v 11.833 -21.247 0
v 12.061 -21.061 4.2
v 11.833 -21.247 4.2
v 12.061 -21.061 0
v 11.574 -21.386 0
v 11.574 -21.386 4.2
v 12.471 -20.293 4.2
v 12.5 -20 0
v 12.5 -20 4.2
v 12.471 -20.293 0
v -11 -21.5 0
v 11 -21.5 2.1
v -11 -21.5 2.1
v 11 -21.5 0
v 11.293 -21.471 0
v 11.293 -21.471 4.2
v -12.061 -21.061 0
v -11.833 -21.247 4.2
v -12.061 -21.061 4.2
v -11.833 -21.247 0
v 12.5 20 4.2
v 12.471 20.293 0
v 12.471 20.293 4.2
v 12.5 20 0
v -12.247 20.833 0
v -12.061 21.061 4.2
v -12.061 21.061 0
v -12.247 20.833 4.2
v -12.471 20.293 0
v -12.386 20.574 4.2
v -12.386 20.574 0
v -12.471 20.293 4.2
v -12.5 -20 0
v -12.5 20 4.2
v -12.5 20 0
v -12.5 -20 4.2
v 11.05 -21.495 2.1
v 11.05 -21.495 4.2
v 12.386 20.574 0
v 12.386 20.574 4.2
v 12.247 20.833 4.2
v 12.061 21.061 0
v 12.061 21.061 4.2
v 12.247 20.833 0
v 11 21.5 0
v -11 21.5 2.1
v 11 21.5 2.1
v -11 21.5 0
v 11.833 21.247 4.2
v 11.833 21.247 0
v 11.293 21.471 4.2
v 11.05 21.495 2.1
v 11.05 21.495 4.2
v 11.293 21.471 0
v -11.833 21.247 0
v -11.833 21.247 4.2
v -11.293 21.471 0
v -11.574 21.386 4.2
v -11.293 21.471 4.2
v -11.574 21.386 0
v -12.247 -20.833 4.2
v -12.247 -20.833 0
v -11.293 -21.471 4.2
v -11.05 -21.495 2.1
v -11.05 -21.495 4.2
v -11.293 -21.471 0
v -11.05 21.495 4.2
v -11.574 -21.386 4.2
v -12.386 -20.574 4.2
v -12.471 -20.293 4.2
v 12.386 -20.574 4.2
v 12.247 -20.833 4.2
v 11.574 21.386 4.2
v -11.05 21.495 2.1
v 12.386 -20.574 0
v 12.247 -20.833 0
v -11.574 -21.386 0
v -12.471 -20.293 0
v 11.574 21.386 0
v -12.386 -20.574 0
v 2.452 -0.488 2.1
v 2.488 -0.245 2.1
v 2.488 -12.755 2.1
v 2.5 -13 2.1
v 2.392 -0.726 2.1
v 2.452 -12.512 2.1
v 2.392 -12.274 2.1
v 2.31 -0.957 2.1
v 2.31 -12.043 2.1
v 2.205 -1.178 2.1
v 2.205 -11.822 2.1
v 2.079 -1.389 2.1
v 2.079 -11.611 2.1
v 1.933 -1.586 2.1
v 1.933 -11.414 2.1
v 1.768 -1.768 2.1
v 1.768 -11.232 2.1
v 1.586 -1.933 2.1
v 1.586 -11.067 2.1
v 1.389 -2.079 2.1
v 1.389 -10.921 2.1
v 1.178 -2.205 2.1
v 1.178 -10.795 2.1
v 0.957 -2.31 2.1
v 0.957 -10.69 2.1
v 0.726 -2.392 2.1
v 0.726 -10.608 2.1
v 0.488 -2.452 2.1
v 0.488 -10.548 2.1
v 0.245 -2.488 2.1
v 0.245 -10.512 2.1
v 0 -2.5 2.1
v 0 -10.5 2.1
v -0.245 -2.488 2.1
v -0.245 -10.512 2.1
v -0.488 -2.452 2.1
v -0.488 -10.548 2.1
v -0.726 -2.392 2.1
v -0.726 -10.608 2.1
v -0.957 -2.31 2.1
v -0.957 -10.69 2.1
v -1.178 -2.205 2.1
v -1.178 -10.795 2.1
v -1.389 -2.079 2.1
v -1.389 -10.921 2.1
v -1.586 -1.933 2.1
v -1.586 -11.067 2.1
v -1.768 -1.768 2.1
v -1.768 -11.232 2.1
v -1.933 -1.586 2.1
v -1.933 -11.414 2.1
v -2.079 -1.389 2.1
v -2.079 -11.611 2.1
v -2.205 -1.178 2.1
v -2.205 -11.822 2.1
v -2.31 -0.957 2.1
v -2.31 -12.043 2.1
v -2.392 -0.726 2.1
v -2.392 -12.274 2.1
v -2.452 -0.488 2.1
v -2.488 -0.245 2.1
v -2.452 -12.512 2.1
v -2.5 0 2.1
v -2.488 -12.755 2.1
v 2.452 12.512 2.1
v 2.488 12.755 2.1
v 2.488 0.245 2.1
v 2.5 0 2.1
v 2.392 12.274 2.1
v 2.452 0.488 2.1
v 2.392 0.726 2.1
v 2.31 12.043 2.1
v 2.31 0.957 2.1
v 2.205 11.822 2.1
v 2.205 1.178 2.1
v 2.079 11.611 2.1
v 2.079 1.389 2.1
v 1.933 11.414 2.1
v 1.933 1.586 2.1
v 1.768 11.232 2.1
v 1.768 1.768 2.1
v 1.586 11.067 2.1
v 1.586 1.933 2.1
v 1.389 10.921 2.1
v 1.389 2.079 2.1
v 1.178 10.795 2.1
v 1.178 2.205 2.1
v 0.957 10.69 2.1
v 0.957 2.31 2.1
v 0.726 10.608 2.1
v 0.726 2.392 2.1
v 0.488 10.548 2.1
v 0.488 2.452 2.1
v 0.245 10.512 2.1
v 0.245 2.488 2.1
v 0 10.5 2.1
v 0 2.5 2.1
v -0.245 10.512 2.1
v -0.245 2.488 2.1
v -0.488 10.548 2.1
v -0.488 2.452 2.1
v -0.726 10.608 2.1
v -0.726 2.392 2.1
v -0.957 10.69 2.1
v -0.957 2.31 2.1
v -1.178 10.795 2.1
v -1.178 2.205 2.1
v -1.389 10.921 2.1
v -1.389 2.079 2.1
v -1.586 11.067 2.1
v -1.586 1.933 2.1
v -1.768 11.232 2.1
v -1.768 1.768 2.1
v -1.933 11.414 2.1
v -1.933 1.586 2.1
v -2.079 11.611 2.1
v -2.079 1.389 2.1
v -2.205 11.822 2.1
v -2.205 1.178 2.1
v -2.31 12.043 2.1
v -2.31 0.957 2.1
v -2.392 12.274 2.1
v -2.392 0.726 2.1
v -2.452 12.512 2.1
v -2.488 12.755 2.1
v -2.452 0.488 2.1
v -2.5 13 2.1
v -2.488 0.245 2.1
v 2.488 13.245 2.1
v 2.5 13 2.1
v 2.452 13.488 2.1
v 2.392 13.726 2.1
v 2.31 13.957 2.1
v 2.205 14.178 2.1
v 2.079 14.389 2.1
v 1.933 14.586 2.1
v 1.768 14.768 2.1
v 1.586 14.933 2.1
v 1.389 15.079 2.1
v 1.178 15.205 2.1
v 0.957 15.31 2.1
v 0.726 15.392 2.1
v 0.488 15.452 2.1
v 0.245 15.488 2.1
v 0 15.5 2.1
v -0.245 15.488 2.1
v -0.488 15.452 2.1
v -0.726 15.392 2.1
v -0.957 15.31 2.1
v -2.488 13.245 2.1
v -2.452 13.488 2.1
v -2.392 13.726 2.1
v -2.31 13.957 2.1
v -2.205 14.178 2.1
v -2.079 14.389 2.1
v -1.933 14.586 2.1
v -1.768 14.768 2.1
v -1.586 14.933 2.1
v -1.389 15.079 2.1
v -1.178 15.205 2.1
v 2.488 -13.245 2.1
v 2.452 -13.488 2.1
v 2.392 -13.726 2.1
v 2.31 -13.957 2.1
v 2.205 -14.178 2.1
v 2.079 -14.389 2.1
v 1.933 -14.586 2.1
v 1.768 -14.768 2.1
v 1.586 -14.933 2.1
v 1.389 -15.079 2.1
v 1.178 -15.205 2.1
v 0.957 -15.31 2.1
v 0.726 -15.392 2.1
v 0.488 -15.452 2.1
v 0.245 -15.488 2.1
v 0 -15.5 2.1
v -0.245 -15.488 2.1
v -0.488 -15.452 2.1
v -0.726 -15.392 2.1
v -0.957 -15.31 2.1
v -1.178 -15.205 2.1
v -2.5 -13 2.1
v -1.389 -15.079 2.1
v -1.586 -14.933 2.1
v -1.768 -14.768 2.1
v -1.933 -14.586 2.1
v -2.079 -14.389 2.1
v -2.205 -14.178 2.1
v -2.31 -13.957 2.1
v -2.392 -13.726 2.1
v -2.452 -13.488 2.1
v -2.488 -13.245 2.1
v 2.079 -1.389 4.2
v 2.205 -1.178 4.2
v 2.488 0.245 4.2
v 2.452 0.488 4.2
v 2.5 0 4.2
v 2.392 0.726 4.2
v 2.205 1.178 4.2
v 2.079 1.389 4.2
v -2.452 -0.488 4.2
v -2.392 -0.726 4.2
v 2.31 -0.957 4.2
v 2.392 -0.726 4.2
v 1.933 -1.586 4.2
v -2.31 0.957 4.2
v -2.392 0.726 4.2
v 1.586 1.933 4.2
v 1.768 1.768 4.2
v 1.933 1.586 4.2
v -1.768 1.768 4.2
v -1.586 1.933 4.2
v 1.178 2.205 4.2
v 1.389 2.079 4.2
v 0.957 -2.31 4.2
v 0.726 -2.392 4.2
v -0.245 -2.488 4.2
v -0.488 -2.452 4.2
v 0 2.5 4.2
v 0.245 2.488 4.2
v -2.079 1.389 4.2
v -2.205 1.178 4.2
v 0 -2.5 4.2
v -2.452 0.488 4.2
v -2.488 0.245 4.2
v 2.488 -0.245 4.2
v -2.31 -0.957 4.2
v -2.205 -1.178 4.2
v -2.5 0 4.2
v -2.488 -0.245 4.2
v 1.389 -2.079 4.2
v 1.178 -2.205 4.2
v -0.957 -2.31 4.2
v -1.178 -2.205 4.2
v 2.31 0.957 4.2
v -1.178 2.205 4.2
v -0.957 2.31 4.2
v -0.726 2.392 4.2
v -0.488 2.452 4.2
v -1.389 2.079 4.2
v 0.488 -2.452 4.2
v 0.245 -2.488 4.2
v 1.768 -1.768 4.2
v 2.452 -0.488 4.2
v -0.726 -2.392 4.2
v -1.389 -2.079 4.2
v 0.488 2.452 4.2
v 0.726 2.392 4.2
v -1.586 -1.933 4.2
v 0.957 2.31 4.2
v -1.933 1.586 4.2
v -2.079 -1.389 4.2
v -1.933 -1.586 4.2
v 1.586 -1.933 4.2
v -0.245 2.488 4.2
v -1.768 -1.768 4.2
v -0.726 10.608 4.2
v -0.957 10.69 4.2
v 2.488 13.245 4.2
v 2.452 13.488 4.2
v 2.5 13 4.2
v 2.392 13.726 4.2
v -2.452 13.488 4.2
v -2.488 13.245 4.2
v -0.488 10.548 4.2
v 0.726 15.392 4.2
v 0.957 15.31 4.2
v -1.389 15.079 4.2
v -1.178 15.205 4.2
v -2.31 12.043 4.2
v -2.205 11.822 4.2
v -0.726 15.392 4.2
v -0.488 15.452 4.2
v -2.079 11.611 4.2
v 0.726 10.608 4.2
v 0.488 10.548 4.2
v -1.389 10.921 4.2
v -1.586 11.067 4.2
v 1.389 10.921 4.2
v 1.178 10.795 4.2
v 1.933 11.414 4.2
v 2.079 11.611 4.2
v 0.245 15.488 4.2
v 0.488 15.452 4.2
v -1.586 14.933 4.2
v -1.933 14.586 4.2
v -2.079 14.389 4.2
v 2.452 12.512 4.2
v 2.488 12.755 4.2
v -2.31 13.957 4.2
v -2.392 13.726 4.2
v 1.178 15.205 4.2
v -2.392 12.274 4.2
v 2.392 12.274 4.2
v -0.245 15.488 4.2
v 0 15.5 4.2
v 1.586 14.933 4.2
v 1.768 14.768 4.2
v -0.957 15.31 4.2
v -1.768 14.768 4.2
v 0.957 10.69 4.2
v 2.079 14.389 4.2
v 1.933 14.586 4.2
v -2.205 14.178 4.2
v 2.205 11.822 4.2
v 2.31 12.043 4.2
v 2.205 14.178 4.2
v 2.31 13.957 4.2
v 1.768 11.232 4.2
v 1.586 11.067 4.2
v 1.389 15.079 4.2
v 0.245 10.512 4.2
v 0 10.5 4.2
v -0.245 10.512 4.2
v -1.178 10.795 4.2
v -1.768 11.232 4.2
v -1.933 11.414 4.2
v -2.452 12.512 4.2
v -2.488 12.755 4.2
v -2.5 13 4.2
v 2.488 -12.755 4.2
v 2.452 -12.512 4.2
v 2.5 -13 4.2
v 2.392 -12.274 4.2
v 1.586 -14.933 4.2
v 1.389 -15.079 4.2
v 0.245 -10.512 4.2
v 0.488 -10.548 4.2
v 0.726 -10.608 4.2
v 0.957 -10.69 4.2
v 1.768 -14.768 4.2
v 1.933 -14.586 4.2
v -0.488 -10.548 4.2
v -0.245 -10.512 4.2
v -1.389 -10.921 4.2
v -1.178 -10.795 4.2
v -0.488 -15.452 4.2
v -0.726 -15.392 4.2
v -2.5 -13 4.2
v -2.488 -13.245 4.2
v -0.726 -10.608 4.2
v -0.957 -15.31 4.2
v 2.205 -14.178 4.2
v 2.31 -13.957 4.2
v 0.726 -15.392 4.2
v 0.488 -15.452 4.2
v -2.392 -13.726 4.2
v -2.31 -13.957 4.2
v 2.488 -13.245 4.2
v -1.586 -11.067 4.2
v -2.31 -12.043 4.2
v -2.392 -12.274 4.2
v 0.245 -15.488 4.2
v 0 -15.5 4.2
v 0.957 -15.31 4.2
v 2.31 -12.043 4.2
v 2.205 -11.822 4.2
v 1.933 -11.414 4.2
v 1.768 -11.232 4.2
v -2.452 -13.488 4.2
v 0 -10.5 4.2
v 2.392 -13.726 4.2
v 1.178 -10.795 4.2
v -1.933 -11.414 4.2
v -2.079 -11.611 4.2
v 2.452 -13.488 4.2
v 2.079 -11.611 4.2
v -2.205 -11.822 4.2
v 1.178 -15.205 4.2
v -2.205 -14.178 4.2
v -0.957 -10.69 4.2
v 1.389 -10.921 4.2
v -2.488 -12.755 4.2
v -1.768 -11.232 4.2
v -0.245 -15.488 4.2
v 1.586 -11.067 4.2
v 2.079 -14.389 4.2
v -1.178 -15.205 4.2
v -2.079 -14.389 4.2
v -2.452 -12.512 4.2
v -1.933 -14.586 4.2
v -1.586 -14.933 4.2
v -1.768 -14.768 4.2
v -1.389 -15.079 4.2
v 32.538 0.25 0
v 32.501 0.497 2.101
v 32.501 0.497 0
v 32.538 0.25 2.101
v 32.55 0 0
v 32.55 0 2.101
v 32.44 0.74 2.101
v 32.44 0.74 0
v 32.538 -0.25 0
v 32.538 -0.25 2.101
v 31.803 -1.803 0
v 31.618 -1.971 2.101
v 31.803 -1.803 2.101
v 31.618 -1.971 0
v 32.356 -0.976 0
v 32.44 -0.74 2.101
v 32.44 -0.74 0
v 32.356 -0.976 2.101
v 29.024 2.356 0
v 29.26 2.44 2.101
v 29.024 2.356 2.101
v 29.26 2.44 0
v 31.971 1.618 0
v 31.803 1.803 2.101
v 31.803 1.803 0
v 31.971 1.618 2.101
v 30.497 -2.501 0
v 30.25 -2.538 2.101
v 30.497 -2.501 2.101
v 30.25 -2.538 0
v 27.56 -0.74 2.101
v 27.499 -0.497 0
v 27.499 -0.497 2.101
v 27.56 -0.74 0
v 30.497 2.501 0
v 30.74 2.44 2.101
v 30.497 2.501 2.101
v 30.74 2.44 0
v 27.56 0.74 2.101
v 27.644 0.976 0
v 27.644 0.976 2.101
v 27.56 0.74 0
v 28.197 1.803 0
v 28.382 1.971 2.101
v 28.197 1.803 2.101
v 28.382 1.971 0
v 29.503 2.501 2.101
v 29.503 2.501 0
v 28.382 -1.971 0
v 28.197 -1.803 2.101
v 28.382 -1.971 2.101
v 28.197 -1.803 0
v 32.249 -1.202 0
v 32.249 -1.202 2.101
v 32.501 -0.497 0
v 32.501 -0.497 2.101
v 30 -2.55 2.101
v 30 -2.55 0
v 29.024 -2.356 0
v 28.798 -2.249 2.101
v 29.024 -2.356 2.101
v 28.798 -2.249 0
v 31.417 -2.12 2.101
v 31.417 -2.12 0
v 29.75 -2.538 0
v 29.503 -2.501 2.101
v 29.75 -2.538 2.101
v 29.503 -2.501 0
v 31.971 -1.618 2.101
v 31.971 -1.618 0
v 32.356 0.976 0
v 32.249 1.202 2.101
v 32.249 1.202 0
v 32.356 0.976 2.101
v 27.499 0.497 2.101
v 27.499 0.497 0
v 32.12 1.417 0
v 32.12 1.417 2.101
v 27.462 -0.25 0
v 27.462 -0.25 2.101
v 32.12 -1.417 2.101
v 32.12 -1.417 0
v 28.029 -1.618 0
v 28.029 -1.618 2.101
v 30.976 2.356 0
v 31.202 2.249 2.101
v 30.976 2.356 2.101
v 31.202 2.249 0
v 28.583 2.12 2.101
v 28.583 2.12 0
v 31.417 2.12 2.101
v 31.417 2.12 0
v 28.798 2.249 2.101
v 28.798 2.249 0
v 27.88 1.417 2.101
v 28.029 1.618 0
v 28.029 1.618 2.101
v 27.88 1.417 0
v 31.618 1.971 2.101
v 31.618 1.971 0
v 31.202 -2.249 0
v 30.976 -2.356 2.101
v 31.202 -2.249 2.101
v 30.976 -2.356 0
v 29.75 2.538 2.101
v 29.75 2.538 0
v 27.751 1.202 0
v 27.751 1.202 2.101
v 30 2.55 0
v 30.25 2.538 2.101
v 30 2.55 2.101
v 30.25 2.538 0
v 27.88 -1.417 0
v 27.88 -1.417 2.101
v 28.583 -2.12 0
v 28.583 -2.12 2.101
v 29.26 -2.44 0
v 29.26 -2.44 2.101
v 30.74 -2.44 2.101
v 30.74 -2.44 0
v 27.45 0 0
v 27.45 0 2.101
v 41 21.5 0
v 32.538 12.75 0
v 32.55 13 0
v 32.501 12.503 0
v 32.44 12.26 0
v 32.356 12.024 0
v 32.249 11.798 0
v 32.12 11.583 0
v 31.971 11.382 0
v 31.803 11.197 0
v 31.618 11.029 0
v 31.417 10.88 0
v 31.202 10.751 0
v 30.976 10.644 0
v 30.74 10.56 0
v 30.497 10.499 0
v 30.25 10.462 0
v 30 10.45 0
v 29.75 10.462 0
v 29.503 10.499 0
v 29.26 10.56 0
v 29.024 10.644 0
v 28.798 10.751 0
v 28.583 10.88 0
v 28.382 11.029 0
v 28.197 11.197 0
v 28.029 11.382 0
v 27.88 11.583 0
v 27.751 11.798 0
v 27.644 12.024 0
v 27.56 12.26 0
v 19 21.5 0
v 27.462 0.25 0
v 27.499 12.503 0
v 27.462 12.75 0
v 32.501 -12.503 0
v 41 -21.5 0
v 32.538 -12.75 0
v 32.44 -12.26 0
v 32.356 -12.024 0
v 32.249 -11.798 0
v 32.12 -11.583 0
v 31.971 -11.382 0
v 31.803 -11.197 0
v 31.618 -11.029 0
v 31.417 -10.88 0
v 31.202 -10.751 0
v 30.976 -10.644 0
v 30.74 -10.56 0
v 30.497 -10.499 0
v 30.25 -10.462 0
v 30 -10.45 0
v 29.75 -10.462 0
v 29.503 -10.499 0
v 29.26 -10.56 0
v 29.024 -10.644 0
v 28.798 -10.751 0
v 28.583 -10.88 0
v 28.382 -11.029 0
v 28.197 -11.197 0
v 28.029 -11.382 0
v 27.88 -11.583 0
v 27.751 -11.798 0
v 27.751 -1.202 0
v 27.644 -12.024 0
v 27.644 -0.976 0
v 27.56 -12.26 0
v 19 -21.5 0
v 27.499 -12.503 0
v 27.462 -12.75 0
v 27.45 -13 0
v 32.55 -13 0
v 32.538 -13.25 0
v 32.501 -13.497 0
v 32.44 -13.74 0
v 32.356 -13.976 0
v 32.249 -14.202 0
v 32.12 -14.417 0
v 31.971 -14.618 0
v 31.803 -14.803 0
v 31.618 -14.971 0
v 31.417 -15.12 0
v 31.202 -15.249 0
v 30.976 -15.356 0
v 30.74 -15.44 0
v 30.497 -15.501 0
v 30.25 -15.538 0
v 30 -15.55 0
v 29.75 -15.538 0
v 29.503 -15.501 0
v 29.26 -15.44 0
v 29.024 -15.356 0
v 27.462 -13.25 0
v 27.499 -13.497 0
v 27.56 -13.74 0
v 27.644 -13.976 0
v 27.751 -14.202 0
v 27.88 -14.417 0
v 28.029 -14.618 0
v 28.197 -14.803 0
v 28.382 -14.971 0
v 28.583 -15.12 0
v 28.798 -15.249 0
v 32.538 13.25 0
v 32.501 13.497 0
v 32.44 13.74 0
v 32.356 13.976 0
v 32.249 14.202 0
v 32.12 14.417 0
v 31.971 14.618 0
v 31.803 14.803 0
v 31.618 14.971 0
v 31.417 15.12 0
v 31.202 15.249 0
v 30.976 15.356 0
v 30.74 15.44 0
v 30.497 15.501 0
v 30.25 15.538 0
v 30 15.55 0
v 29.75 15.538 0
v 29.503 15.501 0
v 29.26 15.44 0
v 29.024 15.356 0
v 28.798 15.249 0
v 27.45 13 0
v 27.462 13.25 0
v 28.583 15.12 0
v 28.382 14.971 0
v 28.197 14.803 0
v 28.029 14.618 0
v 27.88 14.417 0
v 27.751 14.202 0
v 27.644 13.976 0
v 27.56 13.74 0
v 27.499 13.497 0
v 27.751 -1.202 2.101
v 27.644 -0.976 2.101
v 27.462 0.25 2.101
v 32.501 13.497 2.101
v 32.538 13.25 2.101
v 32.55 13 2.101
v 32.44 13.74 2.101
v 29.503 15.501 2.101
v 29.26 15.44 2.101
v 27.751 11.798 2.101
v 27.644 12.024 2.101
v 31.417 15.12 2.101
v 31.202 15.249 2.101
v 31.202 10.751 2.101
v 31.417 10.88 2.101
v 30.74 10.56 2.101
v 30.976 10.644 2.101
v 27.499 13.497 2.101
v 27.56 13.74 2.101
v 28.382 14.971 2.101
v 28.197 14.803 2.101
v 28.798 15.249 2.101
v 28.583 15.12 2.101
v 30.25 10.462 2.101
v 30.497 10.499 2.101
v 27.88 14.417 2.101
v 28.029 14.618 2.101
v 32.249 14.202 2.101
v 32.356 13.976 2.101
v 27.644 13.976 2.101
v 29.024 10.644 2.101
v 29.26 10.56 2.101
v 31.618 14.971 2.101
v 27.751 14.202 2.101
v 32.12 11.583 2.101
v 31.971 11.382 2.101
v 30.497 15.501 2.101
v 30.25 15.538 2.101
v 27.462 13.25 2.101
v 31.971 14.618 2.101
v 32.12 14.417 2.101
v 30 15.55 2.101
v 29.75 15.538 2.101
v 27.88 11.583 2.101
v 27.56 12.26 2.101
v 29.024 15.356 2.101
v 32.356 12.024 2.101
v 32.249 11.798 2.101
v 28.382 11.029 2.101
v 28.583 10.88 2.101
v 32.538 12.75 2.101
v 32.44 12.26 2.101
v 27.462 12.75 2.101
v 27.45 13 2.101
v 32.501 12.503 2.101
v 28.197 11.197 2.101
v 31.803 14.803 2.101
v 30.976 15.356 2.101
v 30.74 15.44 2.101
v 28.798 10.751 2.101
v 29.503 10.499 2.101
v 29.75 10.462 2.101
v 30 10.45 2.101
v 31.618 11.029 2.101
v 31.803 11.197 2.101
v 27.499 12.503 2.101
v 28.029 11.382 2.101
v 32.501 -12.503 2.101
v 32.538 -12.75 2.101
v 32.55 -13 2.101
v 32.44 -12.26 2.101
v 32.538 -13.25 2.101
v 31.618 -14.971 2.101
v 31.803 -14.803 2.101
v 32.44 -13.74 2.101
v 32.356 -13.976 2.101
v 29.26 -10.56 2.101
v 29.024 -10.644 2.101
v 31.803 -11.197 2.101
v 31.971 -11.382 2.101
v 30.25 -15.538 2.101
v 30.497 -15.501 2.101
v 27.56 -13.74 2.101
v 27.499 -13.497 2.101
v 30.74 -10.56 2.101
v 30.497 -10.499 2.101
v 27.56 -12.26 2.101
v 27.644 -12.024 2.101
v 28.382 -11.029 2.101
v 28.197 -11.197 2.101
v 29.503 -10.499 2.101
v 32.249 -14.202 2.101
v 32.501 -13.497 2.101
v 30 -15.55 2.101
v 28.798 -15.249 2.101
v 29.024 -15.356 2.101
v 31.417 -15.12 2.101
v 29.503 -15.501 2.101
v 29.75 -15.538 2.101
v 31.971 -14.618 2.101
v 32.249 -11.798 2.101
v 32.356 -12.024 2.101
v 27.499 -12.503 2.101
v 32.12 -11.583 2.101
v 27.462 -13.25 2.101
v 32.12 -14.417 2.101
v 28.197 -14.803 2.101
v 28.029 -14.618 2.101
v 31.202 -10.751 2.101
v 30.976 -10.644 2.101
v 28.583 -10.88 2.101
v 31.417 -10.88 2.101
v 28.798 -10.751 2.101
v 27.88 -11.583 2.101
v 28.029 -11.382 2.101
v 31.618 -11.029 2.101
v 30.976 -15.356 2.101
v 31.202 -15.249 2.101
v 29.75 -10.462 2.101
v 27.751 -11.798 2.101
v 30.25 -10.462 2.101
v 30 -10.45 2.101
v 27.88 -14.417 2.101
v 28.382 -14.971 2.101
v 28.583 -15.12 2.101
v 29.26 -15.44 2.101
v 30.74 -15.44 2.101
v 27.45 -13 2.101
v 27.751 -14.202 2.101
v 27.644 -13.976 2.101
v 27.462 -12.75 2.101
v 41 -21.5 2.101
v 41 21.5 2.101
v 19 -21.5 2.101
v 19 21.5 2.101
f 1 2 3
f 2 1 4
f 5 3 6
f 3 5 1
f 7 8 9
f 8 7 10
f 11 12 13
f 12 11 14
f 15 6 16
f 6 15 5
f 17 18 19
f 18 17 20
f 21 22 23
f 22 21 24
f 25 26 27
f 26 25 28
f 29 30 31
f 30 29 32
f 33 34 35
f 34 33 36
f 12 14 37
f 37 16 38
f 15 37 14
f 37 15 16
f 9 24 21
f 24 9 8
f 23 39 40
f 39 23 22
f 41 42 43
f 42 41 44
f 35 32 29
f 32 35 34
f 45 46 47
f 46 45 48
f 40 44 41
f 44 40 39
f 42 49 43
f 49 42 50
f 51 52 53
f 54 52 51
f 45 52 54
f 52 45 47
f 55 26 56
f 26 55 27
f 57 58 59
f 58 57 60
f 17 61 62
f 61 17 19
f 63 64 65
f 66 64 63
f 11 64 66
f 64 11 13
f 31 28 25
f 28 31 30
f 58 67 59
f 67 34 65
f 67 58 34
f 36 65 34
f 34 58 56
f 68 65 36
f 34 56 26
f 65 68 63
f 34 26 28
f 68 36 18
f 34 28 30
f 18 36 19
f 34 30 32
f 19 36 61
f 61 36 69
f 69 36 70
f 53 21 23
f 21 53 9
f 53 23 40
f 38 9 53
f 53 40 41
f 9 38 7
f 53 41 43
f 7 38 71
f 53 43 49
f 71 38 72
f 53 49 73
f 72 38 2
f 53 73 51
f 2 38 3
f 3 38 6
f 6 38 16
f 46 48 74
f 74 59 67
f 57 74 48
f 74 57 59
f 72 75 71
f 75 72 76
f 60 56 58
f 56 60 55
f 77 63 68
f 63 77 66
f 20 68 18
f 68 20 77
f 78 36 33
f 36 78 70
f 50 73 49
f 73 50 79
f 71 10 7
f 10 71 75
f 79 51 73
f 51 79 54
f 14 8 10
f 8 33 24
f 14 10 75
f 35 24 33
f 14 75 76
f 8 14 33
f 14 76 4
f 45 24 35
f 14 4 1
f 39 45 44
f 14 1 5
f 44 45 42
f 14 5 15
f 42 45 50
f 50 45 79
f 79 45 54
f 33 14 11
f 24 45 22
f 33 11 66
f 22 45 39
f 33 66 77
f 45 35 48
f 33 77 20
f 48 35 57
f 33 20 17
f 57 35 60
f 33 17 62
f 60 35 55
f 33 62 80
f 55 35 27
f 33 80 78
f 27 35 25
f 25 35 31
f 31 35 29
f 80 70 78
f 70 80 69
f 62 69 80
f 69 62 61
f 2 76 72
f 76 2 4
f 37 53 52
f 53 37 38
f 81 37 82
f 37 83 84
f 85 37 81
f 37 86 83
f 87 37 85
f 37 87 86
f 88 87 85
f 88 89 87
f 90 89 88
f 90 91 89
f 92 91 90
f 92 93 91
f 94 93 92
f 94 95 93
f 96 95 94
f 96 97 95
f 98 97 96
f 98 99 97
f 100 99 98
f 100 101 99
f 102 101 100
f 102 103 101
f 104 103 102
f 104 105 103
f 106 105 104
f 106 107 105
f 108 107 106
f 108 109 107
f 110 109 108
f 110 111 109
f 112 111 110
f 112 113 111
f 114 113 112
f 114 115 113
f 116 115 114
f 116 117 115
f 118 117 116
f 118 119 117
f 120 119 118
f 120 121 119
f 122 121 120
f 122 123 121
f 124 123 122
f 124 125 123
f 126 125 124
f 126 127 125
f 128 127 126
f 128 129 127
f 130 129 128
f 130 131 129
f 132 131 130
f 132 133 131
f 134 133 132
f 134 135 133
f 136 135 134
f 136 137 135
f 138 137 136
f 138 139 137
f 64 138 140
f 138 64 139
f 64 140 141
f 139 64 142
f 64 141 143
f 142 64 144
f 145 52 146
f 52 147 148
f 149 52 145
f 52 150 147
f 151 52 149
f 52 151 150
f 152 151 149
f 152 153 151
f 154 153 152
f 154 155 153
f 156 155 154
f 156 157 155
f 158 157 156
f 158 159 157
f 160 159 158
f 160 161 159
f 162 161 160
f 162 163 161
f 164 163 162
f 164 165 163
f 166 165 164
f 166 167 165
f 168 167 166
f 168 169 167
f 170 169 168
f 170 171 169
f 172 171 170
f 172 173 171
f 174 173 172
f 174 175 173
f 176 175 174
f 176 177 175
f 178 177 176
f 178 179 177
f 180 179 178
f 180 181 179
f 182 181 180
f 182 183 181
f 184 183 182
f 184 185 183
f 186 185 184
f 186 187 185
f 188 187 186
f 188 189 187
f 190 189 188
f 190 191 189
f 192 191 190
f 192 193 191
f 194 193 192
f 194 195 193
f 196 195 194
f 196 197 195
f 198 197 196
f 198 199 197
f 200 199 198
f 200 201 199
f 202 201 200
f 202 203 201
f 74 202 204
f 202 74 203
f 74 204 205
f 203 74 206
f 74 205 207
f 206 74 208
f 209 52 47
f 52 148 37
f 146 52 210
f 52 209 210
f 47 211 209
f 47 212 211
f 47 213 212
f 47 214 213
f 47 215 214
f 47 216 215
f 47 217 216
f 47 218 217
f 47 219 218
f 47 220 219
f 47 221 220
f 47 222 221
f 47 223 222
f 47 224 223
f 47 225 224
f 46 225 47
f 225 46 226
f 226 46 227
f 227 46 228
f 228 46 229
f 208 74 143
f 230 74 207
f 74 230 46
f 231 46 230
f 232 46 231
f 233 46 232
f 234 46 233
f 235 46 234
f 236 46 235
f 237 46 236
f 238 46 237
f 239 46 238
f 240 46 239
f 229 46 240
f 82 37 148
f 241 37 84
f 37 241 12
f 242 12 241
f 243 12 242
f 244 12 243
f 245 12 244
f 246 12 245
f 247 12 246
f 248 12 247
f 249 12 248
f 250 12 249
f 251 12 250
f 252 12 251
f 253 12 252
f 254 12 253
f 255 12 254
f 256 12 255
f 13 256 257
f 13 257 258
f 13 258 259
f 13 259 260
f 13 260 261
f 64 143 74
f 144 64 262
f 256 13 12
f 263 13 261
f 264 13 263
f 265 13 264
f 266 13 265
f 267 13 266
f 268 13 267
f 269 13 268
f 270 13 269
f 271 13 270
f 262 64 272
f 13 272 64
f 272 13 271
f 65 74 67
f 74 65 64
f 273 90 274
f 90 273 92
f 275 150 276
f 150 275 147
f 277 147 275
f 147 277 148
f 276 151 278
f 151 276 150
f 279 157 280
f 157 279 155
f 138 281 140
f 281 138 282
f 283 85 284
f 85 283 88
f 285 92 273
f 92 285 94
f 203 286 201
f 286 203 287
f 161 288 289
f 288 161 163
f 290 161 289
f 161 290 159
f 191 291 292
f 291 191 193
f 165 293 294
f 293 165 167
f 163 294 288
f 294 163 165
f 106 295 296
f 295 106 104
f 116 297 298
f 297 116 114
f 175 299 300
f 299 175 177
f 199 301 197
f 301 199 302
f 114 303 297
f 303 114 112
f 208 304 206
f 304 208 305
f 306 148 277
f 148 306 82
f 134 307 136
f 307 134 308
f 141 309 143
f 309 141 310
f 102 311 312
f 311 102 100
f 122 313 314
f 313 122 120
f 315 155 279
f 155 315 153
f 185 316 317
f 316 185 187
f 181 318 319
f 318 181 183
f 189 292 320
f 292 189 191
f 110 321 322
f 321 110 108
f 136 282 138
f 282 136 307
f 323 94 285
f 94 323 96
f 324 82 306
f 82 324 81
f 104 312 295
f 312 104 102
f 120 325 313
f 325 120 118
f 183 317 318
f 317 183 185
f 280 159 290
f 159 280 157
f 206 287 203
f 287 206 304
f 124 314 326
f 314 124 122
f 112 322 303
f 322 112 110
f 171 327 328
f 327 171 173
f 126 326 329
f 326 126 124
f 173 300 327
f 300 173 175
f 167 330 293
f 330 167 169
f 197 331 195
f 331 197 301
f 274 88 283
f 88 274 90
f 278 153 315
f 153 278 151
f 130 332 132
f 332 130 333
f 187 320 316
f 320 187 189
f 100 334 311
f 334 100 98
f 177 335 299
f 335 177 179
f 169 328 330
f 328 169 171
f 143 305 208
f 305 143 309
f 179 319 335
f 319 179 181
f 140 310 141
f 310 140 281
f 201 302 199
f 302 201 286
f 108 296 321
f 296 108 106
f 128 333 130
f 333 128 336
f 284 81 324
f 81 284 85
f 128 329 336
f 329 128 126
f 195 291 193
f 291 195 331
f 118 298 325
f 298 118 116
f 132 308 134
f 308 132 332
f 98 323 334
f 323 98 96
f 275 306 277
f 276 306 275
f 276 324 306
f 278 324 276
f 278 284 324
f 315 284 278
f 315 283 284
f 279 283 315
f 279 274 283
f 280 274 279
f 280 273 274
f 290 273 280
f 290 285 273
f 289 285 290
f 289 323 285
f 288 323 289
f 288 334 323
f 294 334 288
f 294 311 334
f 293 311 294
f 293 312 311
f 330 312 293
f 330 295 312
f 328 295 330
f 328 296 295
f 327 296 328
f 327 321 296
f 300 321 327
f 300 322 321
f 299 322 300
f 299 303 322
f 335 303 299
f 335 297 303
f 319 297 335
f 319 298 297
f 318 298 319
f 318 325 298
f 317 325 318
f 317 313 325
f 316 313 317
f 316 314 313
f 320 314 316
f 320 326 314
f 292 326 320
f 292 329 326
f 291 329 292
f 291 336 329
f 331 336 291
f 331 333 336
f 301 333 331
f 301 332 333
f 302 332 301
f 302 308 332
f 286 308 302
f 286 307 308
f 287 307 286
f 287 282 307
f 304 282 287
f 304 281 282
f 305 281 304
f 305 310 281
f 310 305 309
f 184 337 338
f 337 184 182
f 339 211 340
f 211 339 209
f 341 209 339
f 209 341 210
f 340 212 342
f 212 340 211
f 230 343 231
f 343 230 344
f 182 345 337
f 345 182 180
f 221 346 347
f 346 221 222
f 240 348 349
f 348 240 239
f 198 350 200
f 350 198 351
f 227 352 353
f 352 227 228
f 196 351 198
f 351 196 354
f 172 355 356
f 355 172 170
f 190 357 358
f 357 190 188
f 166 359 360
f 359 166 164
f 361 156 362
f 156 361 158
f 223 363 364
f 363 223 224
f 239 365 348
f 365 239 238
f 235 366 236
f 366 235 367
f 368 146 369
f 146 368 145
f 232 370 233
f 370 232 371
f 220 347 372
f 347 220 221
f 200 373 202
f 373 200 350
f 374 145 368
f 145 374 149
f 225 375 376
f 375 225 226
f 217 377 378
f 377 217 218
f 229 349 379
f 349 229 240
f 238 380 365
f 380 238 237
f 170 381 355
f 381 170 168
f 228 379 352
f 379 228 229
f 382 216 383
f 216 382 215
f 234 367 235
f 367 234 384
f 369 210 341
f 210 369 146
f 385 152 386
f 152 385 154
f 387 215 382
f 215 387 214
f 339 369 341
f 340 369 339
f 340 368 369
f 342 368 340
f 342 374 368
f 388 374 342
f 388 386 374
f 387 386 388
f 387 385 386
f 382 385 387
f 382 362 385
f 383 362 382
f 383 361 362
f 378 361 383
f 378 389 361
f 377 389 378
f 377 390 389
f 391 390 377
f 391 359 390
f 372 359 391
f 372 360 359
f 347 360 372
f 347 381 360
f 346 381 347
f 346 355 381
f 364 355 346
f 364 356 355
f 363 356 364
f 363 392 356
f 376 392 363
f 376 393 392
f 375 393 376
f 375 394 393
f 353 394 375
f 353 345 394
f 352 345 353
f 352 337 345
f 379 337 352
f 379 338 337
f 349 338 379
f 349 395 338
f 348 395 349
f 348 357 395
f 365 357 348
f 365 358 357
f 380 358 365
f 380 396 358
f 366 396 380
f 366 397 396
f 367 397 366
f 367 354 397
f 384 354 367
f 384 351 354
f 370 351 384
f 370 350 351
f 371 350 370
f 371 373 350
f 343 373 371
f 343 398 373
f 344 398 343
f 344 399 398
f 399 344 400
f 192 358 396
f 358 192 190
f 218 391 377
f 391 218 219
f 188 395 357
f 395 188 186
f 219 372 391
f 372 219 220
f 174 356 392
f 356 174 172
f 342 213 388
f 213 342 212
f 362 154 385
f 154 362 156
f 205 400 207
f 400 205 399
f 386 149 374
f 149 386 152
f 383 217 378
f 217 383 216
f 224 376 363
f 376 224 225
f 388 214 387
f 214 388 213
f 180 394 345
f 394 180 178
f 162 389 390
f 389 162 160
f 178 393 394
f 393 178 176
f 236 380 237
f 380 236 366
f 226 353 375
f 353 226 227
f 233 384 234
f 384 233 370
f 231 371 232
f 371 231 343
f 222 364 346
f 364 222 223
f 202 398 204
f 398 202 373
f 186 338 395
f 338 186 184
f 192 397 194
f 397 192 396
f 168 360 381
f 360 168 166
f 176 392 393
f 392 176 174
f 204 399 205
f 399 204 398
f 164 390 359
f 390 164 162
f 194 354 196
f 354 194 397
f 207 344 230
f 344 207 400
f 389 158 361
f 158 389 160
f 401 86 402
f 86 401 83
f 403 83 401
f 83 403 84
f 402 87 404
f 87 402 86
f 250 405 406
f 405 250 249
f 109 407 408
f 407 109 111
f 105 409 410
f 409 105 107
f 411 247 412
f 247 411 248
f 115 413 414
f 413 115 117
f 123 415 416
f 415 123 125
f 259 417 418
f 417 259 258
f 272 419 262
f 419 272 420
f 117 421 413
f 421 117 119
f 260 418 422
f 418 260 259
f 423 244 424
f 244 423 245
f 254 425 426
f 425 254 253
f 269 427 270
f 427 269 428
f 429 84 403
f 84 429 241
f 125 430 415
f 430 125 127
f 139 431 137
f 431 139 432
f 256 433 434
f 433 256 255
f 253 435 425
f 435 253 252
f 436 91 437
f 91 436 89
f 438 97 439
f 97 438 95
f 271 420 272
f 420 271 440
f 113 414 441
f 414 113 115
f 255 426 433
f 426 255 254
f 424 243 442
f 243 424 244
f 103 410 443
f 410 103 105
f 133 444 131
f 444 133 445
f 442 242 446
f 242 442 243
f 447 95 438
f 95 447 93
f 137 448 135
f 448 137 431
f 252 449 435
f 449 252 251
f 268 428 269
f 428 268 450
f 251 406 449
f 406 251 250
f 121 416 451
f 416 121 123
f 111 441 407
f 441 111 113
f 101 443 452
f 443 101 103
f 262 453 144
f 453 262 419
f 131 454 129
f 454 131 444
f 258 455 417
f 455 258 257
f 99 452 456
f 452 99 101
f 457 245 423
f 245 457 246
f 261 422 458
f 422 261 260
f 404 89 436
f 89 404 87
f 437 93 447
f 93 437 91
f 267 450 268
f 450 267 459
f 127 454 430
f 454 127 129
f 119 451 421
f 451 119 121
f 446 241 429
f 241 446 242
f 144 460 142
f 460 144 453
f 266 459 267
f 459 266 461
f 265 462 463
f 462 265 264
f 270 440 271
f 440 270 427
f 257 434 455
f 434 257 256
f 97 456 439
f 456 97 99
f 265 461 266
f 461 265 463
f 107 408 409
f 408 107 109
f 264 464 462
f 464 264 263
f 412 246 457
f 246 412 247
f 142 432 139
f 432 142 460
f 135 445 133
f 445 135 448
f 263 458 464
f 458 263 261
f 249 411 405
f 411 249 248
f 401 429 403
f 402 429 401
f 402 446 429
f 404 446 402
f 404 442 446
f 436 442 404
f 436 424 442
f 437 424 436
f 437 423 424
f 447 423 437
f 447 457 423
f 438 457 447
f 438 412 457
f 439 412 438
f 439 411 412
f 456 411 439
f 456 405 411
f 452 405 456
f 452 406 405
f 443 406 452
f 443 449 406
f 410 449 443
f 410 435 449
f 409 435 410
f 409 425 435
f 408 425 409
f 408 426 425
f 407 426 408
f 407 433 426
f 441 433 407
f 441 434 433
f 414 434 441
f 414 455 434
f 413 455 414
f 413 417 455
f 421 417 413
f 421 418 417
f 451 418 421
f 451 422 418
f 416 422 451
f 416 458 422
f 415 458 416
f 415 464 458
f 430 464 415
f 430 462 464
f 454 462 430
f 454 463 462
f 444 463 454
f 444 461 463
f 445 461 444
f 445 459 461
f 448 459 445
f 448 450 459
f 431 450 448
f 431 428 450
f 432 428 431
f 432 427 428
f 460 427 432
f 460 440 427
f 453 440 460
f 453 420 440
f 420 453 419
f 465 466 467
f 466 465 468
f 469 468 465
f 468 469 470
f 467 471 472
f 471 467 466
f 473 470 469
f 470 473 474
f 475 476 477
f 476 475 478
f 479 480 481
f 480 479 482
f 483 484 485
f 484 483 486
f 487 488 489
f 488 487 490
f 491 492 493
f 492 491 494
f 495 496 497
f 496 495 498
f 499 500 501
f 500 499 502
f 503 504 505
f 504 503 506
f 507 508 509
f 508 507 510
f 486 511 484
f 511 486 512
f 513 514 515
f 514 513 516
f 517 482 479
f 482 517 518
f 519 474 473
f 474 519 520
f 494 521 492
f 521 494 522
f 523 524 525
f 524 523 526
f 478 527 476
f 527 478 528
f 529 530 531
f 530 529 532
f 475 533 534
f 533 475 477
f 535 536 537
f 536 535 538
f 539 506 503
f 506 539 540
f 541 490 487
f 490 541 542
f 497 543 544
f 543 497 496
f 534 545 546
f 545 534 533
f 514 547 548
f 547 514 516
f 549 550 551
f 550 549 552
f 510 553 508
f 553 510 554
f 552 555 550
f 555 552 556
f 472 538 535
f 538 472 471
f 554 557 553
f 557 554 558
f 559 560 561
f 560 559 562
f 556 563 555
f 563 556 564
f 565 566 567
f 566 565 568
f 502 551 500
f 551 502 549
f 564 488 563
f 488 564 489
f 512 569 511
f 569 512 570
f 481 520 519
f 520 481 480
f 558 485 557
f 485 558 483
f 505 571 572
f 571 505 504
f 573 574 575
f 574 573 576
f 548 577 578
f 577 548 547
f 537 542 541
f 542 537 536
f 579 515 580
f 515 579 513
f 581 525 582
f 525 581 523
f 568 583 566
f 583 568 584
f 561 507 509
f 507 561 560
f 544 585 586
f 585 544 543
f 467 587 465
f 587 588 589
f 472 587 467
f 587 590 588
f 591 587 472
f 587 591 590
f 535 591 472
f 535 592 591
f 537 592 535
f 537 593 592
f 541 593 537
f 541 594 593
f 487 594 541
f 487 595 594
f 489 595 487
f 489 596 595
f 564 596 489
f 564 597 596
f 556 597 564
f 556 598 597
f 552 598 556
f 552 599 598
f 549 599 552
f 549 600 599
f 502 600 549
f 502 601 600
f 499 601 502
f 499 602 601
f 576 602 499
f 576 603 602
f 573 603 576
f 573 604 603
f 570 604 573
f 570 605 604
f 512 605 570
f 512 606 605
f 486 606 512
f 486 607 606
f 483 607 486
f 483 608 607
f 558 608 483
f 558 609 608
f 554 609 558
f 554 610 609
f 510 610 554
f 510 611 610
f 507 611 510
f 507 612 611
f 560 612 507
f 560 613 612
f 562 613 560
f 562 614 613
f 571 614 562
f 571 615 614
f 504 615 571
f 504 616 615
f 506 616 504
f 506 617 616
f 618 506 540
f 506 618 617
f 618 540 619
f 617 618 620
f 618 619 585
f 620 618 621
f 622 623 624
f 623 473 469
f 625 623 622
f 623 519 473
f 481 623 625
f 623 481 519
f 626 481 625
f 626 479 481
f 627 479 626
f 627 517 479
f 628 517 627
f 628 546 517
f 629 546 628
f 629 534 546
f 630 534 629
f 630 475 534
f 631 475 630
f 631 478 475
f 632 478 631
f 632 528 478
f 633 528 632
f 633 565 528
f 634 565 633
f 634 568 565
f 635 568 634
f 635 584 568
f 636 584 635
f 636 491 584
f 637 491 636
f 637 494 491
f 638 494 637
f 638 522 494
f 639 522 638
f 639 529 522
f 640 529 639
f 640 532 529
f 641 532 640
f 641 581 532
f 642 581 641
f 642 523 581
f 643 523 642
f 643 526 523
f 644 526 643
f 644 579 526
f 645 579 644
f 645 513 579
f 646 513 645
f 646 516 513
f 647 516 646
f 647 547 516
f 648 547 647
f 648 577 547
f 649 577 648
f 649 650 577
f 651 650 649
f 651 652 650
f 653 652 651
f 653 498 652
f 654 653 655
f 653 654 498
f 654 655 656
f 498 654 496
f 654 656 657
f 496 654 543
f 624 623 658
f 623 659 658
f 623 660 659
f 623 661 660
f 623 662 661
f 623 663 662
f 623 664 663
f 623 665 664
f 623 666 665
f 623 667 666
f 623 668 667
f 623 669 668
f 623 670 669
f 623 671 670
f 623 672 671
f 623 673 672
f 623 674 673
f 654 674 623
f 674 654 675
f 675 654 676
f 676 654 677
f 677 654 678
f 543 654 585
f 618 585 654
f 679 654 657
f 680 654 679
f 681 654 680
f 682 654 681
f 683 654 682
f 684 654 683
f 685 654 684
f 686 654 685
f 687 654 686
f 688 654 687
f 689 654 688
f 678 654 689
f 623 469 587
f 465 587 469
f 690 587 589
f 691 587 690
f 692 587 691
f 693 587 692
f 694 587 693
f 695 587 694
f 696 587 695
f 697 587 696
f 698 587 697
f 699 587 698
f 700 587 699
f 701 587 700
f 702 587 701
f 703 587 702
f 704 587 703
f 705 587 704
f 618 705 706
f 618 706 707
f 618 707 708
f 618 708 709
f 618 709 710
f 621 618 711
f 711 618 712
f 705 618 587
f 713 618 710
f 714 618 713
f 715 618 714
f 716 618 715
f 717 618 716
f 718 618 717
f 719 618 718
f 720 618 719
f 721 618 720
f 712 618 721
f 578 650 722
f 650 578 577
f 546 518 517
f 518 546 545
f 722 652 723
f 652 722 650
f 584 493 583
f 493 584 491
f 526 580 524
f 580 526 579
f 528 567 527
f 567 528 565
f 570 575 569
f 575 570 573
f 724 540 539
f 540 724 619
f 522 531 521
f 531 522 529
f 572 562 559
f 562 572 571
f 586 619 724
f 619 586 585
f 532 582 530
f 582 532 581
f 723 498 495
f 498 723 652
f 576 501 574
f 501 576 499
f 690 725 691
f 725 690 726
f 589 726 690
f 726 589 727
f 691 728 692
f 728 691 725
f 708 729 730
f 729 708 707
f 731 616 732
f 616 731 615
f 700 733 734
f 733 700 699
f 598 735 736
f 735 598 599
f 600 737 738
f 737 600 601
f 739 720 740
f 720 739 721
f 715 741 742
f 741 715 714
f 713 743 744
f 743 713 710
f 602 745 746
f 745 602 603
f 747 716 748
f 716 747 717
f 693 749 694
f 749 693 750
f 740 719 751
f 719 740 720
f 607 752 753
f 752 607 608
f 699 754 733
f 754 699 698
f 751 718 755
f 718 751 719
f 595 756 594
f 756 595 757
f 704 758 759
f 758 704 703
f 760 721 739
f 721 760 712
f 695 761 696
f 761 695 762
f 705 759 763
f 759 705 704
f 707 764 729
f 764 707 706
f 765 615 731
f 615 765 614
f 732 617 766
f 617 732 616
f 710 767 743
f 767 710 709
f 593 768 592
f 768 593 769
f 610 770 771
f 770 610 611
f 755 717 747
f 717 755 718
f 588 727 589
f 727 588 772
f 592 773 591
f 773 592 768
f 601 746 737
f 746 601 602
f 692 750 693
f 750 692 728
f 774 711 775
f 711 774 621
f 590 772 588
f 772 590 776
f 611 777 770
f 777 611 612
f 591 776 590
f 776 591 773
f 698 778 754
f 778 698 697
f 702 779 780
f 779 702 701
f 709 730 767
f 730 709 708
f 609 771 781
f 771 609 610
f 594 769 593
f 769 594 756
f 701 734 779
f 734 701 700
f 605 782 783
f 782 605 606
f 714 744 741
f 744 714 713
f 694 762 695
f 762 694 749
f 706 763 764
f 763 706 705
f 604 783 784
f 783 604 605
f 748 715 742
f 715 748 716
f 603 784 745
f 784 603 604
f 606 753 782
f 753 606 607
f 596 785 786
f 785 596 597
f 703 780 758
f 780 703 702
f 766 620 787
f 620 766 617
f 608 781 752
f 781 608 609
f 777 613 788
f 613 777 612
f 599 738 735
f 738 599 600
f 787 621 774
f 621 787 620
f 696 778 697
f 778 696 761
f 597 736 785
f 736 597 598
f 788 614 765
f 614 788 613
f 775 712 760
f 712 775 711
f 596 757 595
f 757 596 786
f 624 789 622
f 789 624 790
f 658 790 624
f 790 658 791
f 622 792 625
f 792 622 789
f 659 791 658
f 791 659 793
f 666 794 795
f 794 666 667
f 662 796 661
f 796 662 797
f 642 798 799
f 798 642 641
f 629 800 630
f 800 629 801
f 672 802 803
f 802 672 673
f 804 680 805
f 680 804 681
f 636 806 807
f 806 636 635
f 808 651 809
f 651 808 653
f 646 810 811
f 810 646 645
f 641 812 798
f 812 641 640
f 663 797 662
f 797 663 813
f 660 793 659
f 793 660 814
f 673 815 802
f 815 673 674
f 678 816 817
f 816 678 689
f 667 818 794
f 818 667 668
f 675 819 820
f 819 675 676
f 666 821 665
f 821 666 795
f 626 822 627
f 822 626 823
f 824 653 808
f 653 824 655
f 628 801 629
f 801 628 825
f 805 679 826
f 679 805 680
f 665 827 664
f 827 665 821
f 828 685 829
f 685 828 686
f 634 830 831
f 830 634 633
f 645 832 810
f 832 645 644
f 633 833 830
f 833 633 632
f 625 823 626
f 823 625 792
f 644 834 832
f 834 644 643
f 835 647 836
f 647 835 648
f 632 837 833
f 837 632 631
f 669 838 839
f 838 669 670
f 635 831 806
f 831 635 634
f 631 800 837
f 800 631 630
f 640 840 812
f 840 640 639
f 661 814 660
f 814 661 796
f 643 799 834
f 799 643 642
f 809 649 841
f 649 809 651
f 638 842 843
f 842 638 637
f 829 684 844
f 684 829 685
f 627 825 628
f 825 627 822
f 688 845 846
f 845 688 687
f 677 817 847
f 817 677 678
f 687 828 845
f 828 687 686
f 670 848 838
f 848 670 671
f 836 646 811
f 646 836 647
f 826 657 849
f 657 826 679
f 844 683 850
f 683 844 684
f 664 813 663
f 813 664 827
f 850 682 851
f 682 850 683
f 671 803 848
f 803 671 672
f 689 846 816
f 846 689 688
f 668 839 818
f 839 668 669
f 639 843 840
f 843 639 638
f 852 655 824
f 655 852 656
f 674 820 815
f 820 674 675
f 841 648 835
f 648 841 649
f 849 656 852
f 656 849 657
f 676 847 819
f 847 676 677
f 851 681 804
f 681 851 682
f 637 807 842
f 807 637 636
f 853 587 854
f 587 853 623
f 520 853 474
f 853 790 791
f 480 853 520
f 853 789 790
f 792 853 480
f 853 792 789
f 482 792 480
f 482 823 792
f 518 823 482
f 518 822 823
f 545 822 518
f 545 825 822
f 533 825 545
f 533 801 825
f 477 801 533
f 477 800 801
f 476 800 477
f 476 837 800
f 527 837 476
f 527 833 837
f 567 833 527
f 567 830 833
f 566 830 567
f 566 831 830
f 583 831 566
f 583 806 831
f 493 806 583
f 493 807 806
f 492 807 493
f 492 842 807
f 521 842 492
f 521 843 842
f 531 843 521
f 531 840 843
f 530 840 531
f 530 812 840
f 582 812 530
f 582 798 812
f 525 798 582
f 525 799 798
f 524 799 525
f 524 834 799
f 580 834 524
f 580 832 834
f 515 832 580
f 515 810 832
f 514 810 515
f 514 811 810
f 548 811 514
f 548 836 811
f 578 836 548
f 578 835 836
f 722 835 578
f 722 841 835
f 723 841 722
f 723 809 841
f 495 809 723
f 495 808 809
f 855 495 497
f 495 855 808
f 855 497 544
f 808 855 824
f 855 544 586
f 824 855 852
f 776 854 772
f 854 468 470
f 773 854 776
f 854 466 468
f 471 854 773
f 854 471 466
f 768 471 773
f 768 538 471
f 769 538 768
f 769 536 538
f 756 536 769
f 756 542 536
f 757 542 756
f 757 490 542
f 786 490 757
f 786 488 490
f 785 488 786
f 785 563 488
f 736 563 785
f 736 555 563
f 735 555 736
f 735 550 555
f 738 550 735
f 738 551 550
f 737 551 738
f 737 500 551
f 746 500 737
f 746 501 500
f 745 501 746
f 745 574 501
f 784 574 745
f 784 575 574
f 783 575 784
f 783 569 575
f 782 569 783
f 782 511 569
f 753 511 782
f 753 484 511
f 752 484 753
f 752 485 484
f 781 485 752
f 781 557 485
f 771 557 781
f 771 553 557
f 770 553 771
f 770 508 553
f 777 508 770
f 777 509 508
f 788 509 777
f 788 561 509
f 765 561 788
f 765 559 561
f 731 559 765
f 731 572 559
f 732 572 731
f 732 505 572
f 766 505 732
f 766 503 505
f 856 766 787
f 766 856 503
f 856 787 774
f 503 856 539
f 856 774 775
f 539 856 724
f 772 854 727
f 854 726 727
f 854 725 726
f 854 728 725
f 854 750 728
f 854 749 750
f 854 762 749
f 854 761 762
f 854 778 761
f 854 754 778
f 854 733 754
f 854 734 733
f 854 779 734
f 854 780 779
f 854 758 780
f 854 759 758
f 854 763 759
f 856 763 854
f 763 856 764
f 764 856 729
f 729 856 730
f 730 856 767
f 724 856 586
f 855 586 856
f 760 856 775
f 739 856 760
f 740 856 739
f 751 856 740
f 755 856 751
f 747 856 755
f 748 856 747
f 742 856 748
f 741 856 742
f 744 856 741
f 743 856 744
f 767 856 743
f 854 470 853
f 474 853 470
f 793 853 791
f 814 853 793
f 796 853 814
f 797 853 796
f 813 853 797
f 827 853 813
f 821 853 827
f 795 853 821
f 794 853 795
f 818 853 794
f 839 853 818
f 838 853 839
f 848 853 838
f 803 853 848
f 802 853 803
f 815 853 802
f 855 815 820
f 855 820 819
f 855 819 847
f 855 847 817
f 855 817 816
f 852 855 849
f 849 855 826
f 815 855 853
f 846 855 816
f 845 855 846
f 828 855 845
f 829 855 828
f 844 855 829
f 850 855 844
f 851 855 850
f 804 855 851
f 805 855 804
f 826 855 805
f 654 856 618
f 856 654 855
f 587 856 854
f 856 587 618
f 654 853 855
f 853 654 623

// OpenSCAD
bread_w = 22;
bread_h = 43;

hole_d_raw = 5;

gole_n = 3;
hole_gap = 13;

hole_padding = (bread_h-(gole_n-1)*hole_gap)/2;

margin=1.5;

blade_t=0.2;

t_base=4;
t=t_base+blade_t;

bread_lame(is_bottom=true);
translate([30,0,0])
bread_lame(is_bottom=false);


module bread_lame(is_bottom=true){
  if(is_bottom){
    // base(is_bottom=is_bottom);
    difference(){
      linear_extrude(height=t)
      offset(margin, $fn=32)
      square([bread_w, bread_h-2*margin], center=true);
      translate([0, 0, t/2])
      blade(is_bottom=is_bottom);
    }
    holes(is_bottom=is_bottom);
  } else {
    difference(){
      blade(is_bottom=is_bottom);
      #holes(is_bottom=is_bottom);
    }
  }
}

module blade(is_bottom=true){
  bread_w_corr = is_bottom ? bread_w+.1 : bread_w ;

  translate([-bread_w_corr/2, -(bread_h)/2, 0])
  cube([bread_w_corr, bread_h, t/2+.001], center=false);
}

module holes(is_bottom=true) {
  hole_d = is_bottom ? hole_d_raw : hole_d_raw + .1;

  cylinder(d=hole_d, h=t, $fn=64);
  translate([0, hole_gap, 0])
  cylinder(d=hole_d, h=t, $fn=64);
  translate([0, -hole_gap, 0])
  cylinder(d=hole_d, h=t, $fn=64);
}
